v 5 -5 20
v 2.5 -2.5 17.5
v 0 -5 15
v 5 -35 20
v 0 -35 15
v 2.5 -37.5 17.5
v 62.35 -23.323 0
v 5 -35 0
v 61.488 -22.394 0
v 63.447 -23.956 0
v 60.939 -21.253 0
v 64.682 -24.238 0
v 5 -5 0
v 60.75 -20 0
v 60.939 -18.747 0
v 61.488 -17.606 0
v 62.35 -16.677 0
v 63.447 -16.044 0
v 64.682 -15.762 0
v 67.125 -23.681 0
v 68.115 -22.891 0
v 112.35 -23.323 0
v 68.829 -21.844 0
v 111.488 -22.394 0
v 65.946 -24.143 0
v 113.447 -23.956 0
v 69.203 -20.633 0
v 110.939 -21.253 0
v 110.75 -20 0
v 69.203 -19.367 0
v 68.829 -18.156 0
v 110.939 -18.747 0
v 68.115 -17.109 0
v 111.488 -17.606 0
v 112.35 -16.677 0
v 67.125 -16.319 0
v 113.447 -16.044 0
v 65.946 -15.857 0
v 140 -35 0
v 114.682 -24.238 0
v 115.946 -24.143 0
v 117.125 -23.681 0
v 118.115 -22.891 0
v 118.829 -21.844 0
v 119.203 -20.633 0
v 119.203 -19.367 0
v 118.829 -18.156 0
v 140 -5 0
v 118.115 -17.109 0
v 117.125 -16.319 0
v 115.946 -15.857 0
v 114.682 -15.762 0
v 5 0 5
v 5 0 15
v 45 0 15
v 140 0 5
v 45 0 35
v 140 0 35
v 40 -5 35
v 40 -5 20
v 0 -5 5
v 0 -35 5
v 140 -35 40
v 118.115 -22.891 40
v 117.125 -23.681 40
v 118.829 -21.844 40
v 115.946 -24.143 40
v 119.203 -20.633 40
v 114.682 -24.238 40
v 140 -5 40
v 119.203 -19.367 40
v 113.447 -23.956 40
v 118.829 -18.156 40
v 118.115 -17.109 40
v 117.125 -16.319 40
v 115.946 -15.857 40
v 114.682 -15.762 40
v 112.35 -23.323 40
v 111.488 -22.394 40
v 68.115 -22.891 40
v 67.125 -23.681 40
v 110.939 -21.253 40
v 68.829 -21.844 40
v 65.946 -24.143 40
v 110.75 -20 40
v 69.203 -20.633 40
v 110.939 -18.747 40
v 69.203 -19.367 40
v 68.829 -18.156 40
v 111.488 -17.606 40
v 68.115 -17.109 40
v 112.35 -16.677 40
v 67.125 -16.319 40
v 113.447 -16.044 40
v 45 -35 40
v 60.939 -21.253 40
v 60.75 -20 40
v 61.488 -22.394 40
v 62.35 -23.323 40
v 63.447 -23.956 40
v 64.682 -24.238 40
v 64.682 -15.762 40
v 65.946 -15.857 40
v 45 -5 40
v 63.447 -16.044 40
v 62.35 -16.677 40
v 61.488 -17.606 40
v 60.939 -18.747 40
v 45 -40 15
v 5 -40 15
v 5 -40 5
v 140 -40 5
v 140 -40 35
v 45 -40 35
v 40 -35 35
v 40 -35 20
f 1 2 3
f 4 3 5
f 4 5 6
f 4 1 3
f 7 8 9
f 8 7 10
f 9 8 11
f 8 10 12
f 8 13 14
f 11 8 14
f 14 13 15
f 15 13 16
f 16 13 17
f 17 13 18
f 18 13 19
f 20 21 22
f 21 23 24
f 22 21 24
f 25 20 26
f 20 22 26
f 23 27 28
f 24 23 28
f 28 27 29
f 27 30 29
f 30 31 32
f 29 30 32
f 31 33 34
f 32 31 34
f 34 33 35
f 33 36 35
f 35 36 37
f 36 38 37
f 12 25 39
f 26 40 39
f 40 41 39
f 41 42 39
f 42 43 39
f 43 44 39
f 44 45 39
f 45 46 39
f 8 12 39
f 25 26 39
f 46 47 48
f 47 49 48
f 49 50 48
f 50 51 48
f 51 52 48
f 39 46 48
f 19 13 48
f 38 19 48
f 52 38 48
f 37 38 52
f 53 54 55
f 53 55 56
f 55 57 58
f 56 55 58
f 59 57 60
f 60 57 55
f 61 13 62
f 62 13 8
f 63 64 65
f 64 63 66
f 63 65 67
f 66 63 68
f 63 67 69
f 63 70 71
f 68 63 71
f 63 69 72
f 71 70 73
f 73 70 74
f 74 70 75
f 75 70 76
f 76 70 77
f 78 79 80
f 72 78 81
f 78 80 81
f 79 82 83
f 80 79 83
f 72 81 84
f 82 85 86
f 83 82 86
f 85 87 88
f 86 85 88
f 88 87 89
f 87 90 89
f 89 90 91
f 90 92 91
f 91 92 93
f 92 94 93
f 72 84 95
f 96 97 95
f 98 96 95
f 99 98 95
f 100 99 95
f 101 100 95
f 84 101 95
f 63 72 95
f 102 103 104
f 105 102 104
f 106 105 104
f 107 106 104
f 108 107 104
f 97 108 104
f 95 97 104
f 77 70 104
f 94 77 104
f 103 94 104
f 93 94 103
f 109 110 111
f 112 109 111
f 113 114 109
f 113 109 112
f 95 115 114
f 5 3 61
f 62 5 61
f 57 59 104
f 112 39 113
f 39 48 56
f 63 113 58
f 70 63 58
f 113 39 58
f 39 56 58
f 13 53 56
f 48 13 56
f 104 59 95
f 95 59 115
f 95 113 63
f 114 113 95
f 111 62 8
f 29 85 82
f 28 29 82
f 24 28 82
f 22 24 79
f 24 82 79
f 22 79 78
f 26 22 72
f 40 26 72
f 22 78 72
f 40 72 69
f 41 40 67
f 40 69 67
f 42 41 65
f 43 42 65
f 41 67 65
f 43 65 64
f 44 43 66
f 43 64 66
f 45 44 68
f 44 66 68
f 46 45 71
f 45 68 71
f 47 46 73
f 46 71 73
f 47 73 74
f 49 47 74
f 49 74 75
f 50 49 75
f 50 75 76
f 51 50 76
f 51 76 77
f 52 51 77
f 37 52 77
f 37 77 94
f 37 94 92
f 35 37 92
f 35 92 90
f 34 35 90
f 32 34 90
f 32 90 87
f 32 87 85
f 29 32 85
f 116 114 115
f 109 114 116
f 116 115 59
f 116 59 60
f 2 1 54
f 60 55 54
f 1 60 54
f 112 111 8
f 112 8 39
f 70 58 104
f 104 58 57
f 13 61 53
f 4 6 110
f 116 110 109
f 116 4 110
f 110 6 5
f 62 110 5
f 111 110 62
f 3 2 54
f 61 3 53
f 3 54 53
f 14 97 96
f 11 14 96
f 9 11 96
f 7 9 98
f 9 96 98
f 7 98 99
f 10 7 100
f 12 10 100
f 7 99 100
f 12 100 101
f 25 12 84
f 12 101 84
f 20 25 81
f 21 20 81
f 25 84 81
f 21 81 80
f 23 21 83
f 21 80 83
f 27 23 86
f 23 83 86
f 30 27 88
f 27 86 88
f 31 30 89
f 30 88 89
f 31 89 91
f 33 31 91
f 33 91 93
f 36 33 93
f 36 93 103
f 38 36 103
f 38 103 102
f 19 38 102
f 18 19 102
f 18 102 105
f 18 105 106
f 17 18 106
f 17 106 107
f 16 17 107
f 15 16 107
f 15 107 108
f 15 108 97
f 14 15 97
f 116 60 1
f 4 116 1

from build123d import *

# Parameters (mm, degrees)
F1_DEPTH = 40
F2_SIZE  = 5
F4_D     = 8.5
F6_D     = 8.5
F7_SIZE  = 5
F8_SIZE  = 5


with BuildPart() as f1:
    # F0 (on Front) → F1 (new body)
    with BuildSketch(Plane.XZ):
        Polygon((0, 20), (0, 0), (140, 0), (140, 40), (40, 40), (40, 20), align=None)
    extrude(amount=F1_DEPTH)

    # F2
    f2_edges = [f1.edges().sort_by_distance(p)[0] for p in [
        (40, -20, 40),
        (40, -40, 30),
        (40, 0, 30),
        (0, -20, 20),
        (0, -40, 10),
        (0, -20, 0),
        (0, 0, 10),
        (90, -40, 40),
        (70, -40, 0),
        (90, 0, 40),
        (70, 0, 0),
    ]]
    chamfer(f2_edges, length=F2_SIZE)

    # F4 (through all)
    with Locations(Plane(origin=(0, 0, 0), x_dir=(1, 0, 0), z_dir=(0, 0, -1))):
        with Locations((115, 20)):
            Hole(F4_D / 2)

    # F6 (through all)
    with Locations(Plane(origin=(0, 0, 0), x_dir=(1, 0, 0), z_dir=(0, 0, -1))):
        with Locations((65, 20)):
            Hole(F6_D / 2)

    # F7
    f7_edges = [f1.edges().sort_by_distance(p)[0] for p in [
        (25, 0, 20),
    ]]
    chamfer(f7_edges, length=F7_SIZE)

    # F8
    f8_edges = [f1.edges().sort_by_distance(p)[0] for p in [
        (25, -40, 20),
    ]]
    chamfer(f8_edges, length=F8_SIZE)


solid = f1.part
